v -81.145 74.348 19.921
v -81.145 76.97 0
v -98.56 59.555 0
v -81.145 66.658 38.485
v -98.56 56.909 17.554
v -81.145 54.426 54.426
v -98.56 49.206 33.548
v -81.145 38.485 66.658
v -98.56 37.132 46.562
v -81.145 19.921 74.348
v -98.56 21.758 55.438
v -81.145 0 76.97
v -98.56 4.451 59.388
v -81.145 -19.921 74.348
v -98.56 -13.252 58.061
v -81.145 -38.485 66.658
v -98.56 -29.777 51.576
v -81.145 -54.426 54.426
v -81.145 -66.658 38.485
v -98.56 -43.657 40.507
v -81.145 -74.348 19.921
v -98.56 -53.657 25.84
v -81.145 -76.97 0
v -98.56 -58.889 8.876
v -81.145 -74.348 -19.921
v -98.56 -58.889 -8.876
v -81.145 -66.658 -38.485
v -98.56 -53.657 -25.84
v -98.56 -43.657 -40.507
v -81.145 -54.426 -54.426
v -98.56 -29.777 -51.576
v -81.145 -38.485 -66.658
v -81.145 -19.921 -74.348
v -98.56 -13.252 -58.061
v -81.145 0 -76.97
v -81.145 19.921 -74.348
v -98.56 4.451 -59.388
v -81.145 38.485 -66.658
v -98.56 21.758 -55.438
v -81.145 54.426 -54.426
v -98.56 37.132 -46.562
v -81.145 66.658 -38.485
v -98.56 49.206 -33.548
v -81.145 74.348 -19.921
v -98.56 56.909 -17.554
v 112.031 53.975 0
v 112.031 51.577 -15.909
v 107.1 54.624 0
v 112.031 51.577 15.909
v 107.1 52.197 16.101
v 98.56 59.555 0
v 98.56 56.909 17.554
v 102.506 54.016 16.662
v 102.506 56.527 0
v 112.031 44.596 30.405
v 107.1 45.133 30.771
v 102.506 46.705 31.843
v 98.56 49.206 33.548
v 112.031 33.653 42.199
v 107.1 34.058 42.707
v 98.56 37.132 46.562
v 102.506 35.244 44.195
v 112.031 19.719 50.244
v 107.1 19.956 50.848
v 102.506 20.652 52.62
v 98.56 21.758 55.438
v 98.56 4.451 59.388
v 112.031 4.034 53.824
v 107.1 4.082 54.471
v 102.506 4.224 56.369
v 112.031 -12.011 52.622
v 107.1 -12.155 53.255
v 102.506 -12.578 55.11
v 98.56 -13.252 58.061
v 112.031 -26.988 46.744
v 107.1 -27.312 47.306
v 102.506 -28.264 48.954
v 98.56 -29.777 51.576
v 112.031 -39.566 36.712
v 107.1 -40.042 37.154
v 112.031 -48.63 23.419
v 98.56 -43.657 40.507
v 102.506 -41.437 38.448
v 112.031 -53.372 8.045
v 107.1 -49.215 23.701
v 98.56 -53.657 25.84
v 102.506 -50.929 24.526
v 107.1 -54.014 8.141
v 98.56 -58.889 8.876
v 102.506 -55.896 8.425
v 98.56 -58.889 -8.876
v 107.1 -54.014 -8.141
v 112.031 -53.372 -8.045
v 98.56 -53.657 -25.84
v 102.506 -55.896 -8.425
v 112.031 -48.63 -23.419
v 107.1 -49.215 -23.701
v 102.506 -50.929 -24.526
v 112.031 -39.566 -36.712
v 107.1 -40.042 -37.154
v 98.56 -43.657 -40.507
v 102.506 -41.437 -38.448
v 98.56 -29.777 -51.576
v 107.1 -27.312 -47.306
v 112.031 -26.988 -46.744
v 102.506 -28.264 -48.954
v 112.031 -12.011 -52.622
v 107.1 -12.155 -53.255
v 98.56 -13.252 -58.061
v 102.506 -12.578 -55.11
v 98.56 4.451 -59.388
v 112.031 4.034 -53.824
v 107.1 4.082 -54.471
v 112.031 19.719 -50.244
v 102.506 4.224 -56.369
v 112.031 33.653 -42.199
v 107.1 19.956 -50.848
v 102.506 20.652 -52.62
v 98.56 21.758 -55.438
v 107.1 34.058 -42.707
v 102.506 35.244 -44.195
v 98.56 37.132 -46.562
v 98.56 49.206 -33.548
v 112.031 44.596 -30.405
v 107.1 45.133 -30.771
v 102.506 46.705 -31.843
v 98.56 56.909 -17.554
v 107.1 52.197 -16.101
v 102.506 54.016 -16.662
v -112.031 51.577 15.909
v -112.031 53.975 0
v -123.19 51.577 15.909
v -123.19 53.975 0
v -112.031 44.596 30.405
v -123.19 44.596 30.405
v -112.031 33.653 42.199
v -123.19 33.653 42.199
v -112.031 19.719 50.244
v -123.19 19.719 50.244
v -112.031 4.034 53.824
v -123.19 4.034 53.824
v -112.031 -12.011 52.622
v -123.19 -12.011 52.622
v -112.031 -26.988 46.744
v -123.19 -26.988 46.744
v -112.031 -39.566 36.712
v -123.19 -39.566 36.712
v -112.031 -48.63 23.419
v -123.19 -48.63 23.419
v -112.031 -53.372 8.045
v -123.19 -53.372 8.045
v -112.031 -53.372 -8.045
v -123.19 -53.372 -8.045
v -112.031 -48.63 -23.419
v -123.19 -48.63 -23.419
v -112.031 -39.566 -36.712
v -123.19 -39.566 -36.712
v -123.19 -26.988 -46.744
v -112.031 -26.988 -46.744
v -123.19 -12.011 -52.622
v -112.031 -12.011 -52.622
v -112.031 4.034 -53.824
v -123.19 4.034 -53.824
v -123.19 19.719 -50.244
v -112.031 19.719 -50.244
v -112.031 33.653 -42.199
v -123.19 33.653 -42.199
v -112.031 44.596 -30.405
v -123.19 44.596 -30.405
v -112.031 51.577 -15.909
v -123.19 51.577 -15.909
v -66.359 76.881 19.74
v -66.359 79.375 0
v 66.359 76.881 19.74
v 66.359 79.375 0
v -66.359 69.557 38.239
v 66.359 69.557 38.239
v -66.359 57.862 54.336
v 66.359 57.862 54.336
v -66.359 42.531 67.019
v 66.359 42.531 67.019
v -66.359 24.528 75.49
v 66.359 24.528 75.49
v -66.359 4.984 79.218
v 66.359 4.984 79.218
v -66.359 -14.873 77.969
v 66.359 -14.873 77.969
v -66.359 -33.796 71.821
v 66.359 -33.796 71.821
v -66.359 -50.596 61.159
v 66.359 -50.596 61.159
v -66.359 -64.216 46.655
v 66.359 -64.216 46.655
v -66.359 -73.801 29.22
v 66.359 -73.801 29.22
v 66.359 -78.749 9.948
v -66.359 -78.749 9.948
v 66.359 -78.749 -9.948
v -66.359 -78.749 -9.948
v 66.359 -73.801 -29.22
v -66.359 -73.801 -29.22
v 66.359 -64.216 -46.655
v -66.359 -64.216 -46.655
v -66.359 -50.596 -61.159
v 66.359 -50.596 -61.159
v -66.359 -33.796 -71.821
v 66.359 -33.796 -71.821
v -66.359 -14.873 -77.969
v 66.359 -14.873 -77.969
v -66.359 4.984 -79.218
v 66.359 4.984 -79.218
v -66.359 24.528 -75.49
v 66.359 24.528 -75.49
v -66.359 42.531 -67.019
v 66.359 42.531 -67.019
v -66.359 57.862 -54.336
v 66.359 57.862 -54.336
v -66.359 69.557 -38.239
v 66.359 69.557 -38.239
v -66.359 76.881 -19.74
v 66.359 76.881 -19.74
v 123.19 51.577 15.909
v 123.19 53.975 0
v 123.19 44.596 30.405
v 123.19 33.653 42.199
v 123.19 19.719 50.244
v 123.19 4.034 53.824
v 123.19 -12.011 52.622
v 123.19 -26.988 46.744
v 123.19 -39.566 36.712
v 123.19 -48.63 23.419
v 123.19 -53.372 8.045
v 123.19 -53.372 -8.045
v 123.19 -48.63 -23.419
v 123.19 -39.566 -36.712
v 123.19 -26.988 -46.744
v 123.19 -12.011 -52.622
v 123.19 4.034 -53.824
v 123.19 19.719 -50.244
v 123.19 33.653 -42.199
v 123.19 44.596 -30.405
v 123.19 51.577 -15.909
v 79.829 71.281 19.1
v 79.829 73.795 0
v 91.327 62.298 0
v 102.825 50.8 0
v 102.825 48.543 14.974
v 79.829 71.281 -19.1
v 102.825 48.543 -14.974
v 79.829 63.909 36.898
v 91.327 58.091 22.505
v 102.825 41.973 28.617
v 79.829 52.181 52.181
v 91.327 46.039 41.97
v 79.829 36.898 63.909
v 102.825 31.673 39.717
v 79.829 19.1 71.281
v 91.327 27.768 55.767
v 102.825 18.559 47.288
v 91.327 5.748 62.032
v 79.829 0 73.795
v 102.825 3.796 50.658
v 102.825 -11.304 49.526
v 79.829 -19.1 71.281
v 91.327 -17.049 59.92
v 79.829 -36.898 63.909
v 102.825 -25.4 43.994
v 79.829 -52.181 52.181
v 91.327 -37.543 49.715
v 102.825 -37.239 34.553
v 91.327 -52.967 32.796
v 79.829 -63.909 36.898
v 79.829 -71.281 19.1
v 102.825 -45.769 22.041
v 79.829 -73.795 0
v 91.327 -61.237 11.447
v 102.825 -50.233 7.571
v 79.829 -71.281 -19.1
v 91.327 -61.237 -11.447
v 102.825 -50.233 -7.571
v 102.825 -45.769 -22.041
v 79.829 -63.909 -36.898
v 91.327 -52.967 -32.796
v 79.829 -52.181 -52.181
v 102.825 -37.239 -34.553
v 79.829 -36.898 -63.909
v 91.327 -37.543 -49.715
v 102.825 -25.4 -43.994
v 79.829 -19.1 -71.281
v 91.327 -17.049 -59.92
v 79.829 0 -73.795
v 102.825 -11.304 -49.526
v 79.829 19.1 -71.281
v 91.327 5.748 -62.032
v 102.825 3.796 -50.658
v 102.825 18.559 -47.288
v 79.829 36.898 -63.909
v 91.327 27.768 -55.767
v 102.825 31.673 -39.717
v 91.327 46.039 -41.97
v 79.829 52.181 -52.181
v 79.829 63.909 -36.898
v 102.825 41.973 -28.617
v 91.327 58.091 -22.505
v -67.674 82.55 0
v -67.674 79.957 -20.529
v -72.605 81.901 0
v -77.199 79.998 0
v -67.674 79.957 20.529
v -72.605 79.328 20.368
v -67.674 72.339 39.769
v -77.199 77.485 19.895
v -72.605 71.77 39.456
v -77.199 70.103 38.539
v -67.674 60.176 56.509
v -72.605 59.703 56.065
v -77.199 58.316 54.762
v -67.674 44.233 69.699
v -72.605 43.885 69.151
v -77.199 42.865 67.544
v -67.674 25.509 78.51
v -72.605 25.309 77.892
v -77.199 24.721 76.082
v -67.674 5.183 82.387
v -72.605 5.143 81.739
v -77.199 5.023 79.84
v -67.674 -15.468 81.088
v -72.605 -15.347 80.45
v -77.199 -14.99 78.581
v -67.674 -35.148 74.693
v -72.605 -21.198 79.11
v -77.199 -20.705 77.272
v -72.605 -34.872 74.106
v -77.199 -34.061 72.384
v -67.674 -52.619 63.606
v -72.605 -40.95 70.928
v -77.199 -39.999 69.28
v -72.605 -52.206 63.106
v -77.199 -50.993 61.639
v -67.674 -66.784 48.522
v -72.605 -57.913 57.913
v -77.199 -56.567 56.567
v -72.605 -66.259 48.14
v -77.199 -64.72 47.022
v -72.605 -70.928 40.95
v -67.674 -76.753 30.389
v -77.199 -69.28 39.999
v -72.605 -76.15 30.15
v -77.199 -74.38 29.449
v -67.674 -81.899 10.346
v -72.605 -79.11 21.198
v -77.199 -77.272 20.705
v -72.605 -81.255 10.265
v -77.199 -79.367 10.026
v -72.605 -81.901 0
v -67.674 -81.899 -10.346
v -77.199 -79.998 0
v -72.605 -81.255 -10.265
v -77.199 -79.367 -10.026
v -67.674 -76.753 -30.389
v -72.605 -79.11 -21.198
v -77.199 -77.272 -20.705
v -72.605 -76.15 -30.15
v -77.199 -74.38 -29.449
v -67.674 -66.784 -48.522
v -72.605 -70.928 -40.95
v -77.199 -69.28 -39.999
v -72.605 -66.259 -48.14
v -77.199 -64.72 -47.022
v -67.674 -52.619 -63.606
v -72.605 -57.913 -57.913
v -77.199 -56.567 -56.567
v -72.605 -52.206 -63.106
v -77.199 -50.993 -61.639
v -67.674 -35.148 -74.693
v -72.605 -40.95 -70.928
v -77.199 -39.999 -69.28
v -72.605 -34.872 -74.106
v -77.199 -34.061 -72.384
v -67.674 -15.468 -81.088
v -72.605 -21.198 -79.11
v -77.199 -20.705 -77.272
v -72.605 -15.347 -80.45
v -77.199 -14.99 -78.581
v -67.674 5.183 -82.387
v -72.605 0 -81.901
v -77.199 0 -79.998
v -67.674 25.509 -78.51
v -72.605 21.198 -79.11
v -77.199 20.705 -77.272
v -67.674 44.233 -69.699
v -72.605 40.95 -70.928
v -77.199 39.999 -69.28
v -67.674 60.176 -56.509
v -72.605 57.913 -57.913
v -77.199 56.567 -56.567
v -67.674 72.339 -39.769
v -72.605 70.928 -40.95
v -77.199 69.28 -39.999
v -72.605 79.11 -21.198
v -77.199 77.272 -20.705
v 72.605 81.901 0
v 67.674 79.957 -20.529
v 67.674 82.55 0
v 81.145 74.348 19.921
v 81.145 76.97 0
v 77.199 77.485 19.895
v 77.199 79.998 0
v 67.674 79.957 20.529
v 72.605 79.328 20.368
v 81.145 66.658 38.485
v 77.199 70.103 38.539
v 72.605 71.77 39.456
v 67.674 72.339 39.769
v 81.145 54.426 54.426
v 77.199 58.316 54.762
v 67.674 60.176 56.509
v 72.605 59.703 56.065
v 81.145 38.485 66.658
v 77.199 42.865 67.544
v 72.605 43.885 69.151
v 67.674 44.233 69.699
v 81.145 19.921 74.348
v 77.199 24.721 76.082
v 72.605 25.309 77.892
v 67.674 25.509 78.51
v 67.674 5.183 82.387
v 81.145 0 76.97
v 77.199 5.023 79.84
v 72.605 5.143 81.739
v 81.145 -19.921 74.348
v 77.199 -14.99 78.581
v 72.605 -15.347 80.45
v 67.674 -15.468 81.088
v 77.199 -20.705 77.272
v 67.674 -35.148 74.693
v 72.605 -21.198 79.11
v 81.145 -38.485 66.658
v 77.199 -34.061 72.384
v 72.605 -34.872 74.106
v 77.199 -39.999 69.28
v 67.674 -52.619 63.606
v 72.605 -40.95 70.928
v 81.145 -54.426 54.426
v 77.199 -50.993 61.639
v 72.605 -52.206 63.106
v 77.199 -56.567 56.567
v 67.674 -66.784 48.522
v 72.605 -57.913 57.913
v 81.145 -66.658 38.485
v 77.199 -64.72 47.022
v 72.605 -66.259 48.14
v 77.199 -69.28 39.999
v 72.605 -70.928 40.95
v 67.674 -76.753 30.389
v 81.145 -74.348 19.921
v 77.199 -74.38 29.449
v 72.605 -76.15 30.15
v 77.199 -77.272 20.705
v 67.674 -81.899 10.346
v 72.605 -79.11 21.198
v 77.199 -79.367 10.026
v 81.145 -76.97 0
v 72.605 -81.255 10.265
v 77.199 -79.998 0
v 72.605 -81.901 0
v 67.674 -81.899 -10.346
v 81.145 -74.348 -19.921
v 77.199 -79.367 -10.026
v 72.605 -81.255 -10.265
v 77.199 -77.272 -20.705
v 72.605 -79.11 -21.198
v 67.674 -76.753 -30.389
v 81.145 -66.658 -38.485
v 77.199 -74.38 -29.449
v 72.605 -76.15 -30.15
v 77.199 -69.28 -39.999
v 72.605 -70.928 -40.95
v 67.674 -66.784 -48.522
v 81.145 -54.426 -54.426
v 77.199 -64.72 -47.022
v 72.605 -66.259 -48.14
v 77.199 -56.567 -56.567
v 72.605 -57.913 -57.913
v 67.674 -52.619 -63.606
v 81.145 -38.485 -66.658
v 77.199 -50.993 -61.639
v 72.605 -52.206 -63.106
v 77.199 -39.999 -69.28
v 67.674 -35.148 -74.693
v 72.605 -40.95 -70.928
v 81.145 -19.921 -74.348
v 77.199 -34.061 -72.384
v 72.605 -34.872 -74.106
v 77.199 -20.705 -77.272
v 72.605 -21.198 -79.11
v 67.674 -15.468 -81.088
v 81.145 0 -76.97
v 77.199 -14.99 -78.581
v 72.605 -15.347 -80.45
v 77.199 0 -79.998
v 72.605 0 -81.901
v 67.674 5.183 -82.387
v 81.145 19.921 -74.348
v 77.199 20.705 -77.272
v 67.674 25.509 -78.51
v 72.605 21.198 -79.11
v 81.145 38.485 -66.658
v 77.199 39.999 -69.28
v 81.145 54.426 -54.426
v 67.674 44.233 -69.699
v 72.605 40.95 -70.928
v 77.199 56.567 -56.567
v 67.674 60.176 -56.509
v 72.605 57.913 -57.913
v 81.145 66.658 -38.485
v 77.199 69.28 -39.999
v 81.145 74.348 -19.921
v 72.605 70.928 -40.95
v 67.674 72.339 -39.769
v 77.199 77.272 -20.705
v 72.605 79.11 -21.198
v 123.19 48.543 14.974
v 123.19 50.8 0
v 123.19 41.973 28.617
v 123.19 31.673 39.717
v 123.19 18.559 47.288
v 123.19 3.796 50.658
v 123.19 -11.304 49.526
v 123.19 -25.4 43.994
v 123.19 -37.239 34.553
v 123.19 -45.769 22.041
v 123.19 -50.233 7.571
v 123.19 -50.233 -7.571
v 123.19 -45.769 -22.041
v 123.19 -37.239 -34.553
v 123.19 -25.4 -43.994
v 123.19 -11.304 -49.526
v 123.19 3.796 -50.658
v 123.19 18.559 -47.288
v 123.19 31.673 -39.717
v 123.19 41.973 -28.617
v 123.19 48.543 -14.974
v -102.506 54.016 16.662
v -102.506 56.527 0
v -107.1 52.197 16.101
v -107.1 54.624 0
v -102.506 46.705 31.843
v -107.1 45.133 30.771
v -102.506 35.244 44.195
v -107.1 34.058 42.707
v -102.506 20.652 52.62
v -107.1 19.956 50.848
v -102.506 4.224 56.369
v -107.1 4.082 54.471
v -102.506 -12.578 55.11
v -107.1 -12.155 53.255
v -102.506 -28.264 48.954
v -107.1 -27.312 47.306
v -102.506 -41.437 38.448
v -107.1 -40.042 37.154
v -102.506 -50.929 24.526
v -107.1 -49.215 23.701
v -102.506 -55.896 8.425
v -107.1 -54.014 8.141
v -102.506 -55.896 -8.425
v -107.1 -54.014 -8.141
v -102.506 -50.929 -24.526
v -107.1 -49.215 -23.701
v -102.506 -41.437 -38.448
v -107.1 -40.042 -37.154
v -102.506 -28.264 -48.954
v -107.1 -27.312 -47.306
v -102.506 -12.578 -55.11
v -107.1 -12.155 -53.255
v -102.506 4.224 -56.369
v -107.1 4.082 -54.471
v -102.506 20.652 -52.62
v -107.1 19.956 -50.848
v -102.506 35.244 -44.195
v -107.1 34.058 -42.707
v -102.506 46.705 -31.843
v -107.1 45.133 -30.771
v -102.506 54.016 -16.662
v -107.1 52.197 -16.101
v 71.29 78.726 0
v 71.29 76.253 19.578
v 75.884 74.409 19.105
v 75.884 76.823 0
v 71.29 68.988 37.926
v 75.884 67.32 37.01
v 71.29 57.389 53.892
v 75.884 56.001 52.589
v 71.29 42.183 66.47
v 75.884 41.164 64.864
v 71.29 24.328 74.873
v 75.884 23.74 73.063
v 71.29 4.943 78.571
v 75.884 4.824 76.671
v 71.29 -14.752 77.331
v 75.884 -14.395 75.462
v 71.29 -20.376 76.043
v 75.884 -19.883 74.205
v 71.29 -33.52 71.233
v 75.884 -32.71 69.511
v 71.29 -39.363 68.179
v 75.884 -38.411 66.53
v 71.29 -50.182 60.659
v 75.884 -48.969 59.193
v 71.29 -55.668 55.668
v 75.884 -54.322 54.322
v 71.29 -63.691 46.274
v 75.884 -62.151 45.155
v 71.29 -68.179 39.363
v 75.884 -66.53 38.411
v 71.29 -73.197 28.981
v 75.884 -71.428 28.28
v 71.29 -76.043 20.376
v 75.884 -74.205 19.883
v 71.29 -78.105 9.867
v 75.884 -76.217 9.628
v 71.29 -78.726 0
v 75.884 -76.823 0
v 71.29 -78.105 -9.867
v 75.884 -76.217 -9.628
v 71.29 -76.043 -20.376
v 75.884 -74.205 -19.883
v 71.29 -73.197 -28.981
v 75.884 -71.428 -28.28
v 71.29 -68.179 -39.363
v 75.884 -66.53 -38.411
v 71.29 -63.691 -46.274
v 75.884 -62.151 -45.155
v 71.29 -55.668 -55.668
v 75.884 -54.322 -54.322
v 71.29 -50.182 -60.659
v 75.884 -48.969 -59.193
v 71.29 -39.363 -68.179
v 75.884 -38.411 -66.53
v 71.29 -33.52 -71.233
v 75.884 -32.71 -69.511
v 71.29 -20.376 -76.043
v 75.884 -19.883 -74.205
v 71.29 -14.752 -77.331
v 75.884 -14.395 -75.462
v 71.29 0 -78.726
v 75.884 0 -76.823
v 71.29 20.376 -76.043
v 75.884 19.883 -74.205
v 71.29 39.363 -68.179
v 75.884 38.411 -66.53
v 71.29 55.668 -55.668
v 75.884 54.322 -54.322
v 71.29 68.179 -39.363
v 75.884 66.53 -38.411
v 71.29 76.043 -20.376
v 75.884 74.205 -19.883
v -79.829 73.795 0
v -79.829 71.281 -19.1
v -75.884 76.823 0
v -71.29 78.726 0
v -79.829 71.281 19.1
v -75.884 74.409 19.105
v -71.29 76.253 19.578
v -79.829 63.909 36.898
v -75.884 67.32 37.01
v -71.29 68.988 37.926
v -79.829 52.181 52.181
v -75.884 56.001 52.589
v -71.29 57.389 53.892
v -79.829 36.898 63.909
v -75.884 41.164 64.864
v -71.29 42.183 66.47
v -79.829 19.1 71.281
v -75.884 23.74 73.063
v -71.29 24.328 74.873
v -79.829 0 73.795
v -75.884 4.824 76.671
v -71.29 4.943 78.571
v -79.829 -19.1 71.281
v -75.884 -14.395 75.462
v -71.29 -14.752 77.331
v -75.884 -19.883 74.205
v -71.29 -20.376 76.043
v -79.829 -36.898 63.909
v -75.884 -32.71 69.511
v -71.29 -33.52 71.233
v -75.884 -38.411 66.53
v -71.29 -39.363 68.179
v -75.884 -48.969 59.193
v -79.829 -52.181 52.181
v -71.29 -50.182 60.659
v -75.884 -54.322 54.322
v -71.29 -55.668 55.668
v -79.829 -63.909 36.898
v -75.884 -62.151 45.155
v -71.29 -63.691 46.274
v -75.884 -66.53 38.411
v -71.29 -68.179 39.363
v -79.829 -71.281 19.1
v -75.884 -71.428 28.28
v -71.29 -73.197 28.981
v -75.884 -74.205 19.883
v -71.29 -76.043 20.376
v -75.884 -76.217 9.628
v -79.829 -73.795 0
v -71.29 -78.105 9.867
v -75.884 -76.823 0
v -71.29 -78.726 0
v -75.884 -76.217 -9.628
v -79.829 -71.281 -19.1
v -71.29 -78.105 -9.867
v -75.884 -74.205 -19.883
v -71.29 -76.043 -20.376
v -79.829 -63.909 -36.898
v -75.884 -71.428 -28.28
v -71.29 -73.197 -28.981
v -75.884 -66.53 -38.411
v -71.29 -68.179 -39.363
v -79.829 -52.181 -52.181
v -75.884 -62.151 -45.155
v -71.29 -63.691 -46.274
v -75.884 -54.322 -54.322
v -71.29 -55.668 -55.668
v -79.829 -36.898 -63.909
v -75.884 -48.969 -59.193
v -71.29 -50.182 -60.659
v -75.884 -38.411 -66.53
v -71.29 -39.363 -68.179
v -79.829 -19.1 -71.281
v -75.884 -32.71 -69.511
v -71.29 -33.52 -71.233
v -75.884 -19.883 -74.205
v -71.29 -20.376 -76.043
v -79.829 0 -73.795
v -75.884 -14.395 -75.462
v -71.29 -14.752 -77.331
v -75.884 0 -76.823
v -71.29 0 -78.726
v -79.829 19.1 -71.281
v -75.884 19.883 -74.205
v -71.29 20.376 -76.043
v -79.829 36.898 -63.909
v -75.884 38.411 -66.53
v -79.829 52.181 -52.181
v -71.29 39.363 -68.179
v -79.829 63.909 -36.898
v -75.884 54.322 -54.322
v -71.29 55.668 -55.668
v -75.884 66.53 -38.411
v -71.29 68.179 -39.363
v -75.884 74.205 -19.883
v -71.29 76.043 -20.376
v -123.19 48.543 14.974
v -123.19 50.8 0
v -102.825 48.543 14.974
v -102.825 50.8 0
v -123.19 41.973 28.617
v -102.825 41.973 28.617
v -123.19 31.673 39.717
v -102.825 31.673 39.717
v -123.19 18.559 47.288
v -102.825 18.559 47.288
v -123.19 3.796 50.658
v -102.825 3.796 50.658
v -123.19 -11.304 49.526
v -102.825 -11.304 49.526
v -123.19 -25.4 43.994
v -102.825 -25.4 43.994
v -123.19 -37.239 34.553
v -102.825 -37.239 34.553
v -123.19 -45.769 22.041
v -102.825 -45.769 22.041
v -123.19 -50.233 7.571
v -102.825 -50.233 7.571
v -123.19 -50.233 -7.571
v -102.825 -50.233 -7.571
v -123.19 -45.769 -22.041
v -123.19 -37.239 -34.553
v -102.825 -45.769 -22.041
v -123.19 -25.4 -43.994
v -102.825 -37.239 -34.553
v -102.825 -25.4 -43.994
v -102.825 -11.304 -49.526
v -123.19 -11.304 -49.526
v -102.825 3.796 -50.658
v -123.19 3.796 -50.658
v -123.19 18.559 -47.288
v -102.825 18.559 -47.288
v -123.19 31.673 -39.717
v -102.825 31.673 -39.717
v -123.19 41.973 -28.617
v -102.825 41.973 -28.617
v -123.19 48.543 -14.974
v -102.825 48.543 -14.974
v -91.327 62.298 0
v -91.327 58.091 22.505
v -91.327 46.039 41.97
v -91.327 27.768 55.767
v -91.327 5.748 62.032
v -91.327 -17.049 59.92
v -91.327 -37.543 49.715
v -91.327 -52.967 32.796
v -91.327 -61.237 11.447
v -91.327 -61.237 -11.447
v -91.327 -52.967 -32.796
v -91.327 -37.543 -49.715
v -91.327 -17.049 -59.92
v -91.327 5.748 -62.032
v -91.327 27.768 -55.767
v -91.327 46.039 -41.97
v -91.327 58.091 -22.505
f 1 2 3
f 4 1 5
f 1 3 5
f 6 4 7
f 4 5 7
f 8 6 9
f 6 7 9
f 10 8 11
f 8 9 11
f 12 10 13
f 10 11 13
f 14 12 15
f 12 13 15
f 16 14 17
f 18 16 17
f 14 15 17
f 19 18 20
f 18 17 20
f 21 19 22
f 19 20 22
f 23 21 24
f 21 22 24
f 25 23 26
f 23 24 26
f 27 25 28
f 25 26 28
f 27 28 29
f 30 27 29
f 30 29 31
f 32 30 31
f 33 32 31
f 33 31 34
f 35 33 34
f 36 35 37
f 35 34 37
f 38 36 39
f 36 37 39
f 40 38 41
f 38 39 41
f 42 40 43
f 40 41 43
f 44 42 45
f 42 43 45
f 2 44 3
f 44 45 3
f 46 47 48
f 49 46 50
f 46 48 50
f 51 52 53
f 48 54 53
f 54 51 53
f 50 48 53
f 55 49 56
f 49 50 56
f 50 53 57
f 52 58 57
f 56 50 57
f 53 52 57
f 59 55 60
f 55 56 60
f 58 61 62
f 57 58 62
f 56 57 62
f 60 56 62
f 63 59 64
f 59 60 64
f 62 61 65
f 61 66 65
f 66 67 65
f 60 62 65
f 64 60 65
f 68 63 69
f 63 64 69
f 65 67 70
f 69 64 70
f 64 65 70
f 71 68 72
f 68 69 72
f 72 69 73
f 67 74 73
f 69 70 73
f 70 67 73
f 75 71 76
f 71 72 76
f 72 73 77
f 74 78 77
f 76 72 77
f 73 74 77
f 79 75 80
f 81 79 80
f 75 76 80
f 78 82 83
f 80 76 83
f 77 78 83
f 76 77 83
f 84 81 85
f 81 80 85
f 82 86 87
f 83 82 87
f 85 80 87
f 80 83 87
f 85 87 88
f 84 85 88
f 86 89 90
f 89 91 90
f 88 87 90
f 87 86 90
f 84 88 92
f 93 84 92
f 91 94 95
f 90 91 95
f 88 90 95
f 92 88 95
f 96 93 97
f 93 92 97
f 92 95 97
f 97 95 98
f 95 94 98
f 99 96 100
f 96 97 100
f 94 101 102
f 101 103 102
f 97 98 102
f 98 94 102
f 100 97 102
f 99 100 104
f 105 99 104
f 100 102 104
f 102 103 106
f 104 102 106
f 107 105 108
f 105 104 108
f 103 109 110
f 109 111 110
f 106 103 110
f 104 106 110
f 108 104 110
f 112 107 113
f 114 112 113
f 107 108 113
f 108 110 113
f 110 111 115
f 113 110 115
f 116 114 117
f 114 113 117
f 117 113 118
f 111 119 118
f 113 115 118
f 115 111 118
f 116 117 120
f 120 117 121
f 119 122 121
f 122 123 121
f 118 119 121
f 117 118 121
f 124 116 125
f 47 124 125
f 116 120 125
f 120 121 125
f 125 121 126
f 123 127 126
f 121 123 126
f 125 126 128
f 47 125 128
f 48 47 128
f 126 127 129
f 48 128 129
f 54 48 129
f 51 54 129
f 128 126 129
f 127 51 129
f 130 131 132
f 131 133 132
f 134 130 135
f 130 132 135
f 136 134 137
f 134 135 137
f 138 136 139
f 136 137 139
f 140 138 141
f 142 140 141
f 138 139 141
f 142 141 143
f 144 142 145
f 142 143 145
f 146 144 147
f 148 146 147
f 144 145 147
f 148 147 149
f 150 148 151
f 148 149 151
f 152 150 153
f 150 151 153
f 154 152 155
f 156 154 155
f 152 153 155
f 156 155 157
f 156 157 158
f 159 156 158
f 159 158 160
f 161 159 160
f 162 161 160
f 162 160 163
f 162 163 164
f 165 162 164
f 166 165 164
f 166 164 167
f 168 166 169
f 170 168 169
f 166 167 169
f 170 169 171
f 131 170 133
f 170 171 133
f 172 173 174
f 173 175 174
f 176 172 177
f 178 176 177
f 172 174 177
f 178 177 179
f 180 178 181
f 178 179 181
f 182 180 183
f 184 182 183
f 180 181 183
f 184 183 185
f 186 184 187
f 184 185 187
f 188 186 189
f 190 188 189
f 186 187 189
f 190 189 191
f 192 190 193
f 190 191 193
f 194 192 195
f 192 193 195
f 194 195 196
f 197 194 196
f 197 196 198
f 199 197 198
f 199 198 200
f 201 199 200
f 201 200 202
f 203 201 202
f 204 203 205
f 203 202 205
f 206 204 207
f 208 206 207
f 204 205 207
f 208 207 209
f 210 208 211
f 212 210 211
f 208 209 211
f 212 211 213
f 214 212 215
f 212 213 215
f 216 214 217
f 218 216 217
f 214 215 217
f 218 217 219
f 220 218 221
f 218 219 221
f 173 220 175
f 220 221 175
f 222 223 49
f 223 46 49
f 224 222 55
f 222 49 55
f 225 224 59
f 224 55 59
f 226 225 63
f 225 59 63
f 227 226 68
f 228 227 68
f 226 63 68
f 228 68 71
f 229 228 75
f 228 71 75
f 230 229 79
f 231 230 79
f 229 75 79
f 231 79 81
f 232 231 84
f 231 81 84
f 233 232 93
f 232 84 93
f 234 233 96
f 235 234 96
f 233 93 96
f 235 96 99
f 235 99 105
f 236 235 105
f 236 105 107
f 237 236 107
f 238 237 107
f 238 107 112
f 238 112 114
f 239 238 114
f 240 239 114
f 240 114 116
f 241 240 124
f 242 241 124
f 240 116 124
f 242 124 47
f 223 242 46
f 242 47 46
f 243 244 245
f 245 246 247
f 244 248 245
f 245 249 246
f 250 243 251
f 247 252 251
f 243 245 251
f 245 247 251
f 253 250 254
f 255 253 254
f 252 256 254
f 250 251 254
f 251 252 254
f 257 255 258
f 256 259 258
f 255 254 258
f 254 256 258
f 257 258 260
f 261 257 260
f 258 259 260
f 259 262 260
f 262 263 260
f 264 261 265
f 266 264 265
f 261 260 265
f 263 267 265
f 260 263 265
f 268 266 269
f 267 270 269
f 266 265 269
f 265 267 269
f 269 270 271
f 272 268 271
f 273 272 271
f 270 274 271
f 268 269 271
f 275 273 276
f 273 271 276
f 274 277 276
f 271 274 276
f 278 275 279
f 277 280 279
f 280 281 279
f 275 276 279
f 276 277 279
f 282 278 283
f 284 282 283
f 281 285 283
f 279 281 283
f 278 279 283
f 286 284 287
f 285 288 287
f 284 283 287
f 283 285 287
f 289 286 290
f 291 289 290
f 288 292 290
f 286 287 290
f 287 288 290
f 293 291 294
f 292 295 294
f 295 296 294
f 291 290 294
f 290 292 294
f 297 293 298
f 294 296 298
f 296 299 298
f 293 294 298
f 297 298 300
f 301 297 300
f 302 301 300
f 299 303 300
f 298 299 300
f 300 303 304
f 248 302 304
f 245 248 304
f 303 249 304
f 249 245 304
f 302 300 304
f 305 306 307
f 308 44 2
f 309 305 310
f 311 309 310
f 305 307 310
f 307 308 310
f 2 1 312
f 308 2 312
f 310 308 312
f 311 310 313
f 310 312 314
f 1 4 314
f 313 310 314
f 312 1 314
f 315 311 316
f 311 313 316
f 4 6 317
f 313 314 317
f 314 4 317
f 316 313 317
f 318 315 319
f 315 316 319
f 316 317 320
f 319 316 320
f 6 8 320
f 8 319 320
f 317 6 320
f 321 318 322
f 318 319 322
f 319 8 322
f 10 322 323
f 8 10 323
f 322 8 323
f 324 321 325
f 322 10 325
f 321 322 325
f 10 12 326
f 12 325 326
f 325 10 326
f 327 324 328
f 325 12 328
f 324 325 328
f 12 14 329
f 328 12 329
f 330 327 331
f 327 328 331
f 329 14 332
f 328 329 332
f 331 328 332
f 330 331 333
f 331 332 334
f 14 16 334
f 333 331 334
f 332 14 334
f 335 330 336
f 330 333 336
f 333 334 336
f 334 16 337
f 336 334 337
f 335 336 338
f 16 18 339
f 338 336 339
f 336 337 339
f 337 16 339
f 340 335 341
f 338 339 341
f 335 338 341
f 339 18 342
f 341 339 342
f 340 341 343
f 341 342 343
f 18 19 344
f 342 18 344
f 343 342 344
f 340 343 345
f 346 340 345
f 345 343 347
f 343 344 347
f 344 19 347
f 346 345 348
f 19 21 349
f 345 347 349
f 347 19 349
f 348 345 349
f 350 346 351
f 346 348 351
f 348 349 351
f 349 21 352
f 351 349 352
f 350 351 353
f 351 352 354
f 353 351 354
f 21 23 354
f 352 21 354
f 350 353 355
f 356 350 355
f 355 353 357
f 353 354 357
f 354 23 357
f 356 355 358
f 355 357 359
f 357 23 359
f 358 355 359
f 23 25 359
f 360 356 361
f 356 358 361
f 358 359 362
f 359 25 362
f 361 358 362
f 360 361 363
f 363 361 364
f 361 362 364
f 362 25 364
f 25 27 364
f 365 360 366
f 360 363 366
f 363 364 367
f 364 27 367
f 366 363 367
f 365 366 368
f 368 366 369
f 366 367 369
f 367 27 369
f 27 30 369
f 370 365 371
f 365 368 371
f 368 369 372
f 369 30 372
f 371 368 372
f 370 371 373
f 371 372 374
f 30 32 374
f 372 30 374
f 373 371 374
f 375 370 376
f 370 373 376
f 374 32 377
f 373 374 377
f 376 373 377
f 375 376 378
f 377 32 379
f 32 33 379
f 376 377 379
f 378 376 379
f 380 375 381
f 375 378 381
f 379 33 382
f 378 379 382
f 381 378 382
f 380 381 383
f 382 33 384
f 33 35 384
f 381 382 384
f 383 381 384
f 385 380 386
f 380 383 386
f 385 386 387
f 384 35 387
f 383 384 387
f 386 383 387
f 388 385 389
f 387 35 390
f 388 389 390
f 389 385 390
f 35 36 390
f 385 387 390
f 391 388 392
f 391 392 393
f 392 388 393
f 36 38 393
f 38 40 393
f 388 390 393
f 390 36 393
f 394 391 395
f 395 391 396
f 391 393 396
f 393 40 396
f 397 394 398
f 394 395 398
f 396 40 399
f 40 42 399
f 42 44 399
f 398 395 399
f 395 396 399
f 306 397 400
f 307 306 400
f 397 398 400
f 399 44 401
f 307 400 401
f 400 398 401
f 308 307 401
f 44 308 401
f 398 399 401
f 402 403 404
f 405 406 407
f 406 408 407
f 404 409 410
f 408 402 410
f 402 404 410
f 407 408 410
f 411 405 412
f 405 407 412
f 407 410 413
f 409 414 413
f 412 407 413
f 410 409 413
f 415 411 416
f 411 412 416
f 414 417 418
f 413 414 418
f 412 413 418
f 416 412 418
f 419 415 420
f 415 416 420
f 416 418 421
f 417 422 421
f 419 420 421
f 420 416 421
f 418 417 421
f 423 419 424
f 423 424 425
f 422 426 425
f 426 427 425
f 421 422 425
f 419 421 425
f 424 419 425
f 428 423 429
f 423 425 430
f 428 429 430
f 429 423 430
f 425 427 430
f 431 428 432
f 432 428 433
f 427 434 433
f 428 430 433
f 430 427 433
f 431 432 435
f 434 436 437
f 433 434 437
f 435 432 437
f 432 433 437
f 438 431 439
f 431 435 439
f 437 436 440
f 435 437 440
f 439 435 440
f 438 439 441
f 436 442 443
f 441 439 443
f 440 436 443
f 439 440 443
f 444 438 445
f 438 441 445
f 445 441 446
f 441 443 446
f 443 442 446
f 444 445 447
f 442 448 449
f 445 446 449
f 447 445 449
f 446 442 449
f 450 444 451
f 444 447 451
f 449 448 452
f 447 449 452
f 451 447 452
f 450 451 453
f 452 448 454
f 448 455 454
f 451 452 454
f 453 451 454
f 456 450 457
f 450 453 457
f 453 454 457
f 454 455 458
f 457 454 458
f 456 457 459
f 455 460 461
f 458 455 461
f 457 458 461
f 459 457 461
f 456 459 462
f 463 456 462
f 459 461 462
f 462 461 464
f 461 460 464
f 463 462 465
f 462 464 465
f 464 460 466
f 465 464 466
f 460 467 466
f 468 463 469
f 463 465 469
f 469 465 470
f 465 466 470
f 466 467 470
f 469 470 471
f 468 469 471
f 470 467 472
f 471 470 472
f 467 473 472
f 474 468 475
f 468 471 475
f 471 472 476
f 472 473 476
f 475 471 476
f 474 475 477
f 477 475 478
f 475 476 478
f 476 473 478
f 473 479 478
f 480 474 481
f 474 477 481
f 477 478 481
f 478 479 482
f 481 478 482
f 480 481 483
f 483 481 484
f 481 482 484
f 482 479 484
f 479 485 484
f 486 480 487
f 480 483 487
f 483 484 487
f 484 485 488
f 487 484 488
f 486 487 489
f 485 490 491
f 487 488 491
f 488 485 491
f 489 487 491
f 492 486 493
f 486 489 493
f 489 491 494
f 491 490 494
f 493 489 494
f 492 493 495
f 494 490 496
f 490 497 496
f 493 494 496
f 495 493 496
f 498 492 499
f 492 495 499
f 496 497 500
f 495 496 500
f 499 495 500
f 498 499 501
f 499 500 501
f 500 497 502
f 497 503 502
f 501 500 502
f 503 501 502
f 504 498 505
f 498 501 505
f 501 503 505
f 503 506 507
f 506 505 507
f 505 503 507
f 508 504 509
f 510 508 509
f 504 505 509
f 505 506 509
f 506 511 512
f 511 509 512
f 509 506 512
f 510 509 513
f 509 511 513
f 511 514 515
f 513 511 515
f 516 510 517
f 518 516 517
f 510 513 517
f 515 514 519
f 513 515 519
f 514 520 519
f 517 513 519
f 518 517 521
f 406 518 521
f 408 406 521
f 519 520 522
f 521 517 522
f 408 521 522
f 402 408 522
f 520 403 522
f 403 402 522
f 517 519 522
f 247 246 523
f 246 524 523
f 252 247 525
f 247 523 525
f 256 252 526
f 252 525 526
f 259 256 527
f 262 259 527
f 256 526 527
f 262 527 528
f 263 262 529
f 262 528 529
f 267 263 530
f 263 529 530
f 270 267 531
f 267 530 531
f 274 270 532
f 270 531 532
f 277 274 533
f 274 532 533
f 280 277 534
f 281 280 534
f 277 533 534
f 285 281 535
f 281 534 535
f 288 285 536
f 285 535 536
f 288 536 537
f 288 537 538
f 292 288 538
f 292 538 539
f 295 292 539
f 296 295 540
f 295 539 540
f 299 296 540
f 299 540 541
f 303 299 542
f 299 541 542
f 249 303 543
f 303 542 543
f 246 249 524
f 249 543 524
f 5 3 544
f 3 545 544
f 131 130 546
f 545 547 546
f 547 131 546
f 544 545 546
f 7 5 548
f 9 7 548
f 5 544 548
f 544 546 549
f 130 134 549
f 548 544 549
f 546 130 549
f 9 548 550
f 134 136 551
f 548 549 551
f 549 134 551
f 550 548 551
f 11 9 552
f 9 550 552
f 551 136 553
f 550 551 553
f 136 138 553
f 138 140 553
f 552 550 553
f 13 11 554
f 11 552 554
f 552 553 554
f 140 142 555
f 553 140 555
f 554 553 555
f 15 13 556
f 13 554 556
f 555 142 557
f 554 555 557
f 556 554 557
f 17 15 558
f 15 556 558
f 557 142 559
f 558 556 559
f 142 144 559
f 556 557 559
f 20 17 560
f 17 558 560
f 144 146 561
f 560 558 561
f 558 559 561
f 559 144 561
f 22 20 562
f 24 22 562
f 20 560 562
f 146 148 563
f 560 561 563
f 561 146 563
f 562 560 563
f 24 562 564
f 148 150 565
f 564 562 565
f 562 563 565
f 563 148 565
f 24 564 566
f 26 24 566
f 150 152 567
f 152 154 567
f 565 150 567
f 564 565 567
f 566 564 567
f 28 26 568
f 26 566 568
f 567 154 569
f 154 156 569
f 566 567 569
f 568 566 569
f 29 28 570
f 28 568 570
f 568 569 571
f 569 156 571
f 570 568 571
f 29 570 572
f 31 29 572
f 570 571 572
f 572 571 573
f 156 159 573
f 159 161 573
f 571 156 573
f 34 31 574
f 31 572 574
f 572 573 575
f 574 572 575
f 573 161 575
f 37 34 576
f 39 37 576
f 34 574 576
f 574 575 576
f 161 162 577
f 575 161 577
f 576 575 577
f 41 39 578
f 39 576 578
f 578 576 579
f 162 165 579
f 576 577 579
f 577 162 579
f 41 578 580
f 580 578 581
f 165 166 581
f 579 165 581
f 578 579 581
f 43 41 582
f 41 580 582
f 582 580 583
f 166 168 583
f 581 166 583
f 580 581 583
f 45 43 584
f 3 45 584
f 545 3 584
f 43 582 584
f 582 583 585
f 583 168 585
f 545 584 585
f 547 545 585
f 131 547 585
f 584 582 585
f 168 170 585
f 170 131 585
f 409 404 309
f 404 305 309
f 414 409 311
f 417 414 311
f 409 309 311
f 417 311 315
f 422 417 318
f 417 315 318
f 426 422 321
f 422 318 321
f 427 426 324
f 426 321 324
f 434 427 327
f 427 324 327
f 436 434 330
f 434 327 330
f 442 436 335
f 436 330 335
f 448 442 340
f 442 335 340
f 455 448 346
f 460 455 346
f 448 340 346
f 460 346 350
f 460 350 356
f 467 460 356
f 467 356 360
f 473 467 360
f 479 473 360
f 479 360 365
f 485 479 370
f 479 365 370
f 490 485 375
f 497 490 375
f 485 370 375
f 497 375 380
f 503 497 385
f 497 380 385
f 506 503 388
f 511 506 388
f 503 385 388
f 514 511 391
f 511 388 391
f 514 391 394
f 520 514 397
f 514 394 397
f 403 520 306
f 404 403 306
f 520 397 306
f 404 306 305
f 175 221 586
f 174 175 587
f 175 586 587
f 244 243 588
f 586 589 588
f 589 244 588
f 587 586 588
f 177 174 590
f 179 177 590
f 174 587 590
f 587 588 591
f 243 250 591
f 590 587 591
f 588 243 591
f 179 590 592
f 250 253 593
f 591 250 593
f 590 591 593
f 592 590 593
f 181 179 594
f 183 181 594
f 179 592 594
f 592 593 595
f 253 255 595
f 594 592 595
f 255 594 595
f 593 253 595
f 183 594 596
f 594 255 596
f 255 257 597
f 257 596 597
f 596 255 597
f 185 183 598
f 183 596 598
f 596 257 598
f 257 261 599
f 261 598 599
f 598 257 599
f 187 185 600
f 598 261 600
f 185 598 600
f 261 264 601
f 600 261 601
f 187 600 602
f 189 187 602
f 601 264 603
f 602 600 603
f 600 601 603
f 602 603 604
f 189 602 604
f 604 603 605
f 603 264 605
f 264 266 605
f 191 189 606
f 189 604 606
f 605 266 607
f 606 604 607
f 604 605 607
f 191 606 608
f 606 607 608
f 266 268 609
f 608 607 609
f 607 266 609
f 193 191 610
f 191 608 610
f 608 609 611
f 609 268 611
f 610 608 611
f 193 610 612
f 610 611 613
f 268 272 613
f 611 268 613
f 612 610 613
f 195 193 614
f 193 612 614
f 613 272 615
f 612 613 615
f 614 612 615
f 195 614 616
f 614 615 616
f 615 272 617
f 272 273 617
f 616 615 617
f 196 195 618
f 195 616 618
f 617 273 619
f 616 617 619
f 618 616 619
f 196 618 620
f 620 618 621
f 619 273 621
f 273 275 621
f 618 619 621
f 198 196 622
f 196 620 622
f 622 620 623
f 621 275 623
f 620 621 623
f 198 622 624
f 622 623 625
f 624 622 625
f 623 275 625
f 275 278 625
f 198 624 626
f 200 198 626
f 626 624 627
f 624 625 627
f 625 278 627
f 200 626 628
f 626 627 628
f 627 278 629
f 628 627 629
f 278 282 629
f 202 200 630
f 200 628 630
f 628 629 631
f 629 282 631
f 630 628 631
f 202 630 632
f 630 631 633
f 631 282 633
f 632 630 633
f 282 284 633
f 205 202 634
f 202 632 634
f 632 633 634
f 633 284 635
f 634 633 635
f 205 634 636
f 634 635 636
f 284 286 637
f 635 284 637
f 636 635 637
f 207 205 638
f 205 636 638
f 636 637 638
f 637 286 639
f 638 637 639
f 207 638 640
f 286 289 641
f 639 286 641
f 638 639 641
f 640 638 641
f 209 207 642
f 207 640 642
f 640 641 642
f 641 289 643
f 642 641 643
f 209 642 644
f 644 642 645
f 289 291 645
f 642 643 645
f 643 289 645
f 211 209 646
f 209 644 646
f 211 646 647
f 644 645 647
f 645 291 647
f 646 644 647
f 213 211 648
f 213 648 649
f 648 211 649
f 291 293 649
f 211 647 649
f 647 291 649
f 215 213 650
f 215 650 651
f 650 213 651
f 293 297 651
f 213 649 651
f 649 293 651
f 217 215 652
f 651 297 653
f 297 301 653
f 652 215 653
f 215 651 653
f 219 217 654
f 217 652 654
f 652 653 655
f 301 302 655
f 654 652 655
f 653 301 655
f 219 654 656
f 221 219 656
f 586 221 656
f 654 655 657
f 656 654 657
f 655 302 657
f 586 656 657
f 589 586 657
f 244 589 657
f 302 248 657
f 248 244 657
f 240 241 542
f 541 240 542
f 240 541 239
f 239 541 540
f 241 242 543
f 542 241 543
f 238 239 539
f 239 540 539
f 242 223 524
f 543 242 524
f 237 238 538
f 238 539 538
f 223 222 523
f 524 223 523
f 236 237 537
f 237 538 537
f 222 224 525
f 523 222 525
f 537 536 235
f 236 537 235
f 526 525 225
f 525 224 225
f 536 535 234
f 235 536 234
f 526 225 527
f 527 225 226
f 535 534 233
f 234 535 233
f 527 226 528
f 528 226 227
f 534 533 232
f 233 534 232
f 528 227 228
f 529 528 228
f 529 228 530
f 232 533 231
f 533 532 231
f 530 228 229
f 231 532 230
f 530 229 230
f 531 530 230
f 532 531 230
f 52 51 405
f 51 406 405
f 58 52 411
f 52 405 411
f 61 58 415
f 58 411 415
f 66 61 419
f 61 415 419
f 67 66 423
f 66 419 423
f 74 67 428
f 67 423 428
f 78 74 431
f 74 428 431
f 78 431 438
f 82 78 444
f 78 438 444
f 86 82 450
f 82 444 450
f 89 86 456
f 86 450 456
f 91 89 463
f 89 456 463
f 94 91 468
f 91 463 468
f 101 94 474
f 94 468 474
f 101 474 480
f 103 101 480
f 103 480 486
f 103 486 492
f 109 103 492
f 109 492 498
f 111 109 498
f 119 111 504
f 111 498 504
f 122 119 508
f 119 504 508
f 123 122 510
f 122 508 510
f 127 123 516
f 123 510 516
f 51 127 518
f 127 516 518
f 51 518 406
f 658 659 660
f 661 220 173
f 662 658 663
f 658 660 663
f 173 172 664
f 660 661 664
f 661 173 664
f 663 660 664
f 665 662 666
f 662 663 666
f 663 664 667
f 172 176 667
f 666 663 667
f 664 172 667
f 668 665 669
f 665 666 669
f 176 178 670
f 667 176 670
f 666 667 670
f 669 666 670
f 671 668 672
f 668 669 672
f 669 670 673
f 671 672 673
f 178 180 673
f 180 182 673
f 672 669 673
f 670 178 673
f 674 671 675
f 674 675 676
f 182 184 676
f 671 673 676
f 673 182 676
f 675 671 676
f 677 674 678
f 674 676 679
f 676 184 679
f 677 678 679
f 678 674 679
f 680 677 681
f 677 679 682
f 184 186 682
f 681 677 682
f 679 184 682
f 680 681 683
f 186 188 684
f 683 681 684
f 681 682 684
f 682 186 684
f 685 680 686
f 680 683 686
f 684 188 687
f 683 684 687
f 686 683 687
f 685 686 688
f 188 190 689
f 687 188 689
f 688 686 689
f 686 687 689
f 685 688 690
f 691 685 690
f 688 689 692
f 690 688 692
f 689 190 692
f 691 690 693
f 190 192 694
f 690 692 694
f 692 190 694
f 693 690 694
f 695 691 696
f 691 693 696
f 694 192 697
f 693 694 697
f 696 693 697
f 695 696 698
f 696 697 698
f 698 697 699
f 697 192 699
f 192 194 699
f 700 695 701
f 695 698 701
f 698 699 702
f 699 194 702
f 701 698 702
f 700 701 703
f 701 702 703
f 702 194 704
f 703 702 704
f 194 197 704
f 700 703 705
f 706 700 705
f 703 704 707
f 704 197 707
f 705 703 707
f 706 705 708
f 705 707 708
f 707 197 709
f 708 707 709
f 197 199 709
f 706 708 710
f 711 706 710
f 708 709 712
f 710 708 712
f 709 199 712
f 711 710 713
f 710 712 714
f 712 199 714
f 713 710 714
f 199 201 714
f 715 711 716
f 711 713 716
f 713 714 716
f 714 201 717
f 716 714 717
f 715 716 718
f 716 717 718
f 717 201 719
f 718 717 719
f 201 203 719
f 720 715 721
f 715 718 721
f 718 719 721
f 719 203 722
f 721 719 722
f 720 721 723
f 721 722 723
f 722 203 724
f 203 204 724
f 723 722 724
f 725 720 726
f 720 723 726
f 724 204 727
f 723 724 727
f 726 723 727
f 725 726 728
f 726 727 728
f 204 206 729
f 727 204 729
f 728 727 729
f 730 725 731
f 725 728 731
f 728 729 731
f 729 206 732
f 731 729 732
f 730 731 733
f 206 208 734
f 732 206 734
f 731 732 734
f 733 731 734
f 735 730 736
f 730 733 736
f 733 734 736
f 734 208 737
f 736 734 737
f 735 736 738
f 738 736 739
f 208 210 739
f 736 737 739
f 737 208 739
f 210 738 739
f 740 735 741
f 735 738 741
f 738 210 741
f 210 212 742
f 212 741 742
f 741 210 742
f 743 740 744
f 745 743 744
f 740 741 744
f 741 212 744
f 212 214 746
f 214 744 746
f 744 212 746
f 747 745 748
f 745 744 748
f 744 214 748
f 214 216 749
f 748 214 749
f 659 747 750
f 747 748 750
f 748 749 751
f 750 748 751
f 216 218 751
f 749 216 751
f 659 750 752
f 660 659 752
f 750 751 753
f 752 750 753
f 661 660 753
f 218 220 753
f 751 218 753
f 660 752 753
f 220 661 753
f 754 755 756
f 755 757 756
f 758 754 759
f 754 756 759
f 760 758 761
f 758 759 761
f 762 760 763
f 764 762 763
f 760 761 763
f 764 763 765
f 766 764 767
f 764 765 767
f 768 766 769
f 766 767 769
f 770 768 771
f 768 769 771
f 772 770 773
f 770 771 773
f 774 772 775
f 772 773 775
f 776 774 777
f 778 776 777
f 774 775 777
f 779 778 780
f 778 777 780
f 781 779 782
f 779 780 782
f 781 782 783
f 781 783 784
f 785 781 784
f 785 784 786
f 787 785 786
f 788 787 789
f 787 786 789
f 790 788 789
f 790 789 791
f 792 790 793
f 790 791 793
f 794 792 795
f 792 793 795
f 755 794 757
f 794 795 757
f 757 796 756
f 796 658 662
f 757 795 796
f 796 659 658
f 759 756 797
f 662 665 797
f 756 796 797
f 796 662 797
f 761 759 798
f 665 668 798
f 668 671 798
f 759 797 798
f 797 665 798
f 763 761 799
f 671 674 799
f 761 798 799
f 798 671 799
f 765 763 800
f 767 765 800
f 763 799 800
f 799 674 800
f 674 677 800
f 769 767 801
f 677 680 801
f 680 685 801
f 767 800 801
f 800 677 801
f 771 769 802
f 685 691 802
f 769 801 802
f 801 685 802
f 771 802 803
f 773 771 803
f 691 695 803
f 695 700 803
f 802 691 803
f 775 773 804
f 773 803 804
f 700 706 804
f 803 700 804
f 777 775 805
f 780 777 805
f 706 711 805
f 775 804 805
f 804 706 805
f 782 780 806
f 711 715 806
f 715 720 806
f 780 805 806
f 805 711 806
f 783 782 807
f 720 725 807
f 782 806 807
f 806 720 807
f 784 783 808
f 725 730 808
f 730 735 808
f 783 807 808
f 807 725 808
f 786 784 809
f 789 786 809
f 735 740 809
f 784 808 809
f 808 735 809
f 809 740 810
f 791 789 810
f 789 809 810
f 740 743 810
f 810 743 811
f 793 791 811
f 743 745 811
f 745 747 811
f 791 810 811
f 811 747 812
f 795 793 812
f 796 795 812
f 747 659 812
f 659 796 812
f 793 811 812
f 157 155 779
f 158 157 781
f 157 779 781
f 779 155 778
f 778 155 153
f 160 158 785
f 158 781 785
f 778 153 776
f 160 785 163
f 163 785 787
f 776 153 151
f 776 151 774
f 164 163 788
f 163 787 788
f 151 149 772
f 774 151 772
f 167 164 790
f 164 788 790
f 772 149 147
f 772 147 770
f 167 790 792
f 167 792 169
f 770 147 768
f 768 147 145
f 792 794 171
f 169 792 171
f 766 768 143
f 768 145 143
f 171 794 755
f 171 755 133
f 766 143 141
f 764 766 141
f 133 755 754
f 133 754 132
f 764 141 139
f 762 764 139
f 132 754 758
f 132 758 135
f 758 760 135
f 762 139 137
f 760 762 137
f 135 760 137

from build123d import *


with BuildPart() as part:
    # Sketch1 → Revolve1 (revolve)
    with BuildSketch(Plane.XY):
        with BuildLine():
            Line((-123.19, 53.975), (-123.19, 50.8))
            Line((-123.19, 50.8), (-102.824871939, 50.8))
            Line((-102.824871939, 50.8), (-79.829487758, 73.795384182))
            ThreePointArc((-79.829487758, 73.795384182), (-73.649222963, 77.924905094), (-66.359103576, 79.375))
            Line((-66.359103576, 79.375), (66.359103576, 79.375))
            ThreePointArc((66.359103576, 79.375), (73.649222963, 77.924905094), (79.829487758, 73.795384182))
            Line((79.829487758, 73.795384182), (102.824871939, 50.8))
            Line((102.824871939, 50.8), (123.19, 50.8))
            Line((123.19, 50.8), (123.19, 53.975))
            Line((123.19, 53.975), (112.030768363, 53.975))
            ThreePointArc((112.030768363, 53.975), (104.740648977, 55.425094906), (98.560384182, 59.554615818))
            Line((98.560384182, 59.554615818), (81.144615818, 76.970384182))
            ThreePointArc((81.144615818, 76.970384182), (74.964351023, 81.099905094), (67.674231637, 82.55))
            Line((67.674231637, 82.55), (-67.674231637, 82.55))
            ThreePointArc((-67.674231637, 82.55), (-74.964351023, 81.099905094), (-81.144615818, 76.970384182))
            Line((-81.144615818, 76.970384182), (-98.560384182, 59.554615818))
            ThreePointArc((-98.560384182, 59.554615818), (-104.740648977, 55.425094906), (-112.030768363, 53.975))
            Line((-112.030768363, 53.975), (-123.19, 53.975))
        make_face()
    revolve(axis=Axis((-123.19, 0, 0), (1, 0, 0)))


solid = part.part
